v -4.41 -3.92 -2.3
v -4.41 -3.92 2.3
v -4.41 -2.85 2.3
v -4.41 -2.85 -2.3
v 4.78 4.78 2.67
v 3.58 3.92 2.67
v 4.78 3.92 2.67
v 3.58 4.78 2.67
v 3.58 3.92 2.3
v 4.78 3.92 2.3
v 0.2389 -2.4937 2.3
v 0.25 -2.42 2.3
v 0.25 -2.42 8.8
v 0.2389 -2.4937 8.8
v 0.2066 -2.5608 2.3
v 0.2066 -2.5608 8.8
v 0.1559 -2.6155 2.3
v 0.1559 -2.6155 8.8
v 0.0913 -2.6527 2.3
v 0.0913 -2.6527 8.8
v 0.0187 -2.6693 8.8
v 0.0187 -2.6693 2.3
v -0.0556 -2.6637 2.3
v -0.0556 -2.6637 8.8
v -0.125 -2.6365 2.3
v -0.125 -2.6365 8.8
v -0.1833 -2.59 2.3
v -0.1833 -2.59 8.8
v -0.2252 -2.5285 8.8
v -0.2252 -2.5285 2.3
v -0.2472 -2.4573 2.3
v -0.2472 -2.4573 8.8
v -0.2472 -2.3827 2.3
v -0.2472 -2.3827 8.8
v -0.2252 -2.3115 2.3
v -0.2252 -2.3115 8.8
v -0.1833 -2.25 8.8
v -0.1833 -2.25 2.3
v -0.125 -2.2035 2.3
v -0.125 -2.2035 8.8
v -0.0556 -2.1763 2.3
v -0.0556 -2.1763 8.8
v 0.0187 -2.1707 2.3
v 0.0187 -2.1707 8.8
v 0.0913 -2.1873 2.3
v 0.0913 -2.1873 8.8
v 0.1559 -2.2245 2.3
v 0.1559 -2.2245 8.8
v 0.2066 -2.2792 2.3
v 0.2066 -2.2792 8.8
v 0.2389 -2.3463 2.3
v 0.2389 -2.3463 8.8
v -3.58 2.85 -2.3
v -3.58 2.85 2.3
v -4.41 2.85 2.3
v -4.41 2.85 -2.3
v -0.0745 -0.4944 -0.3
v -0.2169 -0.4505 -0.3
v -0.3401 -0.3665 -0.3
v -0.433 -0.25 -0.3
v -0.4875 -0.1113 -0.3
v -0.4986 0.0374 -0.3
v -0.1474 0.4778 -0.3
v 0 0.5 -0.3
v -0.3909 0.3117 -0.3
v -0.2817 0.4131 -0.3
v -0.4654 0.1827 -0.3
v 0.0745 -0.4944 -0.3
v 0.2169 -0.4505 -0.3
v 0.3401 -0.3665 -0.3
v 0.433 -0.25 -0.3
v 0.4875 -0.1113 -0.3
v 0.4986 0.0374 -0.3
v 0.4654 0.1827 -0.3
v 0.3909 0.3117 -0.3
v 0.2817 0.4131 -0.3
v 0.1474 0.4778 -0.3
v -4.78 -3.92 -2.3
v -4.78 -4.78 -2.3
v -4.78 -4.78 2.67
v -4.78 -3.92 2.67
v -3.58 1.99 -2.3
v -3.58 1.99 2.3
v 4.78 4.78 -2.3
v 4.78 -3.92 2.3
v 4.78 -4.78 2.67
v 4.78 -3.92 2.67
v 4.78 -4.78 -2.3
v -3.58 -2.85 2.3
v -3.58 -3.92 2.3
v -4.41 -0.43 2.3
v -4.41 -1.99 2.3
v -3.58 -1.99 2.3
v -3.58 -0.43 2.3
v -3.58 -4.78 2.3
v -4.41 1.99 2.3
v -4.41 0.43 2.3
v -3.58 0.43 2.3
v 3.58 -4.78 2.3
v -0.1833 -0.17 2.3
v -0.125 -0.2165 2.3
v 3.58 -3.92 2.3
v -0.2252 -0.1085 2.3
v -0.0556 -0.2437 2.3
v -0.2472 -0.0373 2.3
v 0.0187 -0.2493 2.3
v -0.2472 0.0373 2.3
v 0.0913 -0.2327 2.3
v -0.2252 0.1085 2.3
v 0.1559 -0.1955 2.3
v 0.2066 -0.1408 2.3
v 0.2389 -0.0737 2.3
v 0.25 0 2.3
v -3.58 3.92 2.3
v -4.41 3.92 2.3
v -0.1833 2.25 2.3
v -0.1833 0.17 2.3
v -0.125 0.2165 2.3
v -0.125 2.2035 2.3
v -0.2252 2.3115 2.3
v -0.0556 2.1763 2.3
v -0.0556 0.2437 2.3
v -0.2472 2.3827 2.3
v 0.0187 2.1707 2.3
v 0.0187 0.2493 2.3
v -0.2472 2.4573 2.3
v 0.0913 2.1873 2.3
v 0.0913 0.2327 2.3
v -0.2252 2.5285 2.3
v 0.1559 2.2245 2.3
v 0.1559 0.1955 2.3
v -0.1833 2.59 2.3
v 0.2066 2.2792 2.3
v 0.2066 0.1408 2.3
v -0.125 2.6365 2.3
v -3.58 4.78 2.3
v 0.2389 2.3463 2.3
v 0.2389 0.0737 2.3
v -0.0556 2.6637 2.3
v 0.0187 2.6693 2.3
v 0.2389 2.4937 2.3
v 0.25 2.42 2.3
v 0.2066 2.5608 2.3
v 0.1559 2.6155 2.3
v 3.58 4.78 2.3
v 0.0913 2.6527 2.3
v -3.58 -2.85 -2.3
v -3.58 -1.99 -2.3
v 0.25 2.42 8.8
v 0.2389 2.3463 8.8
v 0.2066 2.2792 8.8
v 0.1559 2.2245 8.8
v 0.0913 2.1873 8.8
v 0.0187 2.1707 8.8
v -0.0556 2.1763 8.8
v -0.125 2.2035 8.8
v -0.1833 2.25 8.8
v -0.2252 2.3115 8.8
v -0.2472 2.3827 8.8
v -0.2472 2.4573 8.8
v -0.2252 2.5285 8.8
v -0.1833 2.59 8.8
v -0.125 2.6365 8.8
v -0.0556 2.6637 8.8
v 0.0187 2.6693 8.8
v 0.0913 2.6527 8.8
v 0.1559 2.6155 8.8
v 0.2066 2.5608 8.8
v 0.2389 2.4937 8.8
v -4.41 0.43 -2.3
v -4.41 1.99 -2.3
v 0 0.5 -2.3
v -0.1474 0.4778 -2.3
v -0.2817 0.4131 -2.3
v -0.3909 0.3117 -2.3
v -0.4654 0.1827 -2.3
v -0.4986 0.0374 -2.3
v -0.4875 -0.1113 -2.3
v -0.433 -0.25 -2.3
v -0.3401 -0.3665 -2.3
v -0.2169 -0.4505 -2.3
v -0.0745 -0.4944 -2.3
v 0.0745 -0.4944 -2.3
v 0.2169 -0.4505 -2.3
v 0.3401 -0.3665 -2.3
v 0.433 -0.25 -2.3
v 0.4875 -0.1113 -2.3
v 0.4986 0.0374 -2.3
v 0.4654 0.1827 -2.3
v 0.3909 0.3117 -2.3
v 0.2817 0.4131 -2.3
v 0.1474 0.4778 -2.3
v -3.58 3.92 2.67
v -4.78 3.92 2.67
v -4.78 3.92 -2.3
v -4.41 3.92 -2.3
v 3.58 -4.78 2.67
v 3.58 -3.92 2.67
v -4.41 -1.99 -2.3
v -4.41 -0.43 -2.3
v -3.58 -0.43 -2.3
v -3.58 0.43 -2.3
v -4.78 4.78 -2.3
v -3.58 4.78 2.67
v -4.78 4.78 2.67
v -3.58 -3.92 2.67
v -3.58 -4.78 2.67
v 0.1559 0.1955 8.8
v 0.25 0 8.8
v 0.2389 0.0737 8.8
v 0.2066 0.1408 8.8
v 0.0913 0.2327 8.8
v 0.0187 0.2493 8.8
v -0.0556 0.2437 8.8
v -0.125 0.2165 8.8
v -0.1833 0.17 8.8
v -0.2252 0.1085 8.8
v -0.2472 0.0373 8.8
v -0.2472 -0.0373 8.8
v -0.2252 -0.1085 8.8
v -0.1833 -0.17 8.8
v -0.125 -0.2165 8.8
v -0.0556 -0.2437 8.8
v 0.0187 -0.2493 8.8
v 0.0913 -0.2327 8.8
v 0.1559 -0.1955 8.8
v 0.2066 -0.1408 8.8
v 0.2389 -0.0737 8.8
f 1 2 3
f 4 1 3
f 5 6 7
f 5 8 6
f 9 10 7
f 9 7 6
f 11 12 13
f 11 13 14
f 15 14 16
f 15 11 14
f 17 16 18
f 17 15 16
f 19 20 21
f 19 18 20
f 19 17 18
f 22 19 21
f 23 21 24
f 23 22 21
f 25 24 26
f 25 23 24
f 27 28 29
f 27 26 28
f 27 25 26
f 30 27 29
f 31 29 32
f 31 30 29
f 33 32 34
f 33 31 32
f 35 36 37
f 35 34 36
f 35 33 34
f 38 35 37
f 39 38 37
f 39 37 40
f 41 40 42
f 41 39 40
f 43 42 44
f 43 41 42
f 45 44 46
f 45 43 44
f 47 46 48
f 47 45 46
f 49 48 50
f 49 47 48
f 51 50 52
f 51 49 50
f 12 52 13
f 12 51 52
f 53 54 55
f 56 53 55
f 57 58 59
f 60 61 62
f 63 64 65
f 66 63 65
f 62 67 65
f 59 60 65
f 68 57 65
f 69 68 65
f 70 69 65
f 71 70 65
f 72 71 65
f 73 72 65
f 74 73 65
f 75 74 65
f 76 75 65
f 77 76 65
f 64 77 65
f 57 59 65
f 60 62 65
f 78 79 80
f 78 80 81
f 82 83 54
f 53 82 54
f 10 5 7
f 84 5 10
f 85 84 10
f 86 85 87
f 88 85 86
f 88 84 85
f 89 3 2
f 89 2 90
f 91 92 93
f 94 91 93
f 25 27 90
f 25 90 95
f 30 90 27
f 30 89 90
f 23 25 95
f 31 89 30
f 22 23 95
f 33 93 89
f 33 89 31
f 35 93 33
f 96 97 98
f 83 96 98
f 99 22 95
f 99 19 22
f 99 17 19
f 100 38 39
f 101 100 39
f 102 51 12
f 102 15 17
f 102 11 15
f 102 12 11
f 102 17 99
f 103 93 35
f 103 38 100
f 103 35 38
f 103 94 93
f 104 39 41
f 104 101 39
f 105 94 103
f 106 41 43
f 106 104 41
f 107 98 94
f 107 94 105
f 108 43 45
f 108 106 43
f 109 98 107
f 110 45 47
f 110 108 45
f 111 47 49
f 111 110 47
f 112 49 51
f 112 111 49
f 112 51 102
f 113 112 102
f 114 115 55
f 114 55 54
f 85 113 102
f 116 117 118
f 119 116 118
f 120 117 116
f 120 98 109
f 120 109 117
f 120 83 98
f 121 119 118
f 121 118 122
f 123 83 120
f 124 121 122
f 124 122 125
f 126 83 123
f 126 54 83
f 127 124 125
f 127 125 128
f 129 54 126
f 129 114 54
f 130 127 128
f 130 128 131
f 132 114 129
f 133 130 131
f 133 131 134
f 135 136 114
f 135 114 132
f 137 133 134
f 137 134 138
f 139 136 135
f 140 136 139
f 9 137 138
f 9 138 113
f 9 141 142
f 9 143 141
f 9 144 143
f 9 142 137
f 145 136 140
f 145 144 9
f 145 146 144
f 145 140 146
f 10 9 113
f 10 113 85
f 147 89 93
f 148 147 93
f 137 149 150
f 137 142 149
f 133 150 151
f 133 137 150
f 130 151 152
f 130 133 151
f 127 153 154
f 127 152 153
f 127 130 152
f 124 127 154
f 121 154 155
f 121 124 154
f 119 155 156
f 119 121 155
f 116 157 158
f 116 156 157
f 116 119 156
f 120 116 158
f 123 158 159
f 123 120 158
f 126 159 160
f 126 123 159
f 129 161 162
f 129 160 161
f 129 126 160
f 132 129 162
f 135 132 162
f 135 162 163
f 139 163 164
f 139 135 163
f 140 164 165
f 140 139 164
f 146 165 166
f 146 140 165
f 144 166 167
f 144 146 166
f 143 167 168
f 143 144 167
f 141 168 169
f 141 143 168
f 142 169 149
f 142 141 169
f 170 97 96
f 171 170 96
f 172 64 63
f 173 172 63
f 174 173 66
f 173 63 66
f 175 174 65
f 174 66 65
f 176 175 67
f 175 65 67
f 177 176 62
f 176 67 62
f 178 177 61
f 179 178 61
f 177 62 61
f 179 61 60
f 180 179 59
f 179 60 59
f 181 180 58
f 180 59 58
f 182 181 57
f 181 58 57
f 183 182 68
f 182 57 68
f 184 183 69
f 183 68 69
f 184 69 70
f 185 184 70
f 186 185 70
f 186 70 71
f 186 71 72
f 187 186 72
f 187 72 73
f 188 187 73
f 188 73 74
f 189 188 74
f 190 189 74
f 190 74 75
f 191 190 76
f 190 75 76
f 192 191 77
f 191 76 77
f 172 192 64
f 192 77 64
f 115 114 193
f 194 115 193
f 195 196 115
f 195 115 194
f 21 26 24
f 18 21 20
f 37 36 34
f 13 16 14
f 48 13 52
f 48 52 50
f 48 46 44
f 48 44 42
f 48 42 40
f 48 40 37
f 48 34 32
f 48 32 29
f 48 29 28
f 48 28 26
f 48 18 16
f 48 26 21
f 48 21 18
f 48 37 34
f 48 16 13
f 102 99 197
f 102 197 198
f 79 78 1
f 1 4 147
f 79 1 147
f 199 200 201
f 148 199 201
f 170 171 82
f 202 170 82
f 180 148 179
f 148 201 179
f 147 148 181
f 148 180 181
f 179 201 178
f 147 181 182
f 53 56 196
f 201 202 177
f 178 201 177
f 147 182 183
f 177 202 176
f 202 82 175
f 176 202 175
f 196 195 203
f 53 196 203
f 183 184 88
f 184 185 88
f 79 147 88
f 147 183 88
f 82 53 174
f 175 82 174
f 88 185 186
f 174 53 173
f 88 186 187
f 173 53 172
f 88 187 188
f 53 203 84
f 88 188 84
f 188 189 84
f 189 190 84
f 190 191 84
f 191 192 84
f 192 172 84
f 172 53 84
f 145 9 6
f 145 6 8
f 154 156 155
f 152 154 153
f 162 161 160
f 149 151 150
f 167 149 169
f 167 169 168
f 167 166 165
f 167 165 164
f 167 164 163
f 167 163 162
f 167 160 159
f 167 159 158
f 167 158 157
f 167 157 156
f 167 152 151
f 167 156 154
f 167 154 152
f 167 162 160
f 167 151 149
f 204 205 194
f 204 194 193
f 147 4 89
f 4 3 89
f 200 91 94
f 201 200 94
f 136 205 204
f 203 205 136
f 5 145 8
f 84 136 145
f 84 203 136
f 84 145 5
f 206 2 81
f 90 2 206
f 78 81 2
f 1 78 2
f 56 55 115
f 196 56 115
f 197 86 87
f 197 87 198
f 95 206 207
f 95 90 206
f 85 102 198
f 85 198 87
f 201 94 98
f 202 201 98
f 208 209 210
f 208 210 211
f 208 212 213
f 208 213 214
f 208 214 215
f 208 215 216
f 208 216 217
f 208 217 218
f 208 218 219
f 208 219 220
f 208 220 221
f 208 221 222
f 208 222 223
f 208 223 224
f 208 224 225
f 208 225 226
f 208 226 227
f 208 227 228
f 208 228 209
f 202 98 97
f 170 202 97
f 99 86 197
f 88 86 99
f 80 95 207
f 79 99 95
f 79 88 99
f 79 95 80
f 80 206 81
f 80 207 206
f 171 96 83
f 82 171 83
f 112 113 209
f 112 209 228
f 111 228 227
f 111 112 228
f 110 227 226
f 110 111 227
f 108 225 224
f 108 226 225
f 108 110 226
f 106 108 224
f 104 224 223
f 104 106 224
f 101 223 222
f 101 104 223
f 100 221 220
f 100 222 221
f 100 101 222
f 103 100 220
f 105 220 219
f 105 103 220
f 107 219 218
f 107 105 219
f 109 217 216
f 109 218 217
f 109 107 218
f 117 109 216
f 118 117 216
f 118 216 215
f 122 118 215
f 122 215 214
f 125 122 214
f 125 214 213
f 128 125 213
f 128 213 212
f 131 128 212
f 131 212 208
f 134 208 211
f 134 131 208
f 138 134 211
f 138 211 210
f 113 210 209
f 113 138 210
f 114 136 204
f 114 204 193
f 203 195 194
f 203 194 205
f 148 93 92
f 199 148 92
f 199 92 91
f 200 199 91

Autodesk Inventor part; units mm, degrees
ref_plane "YZ Plane" through (0, 0, 0) normal (1, 0, 0) x (0, 1, 0)
ref_plane "XZ Plane" through (0, 0, 0) normal (0, 1, 0) x (-1, 0, 0)
ref_plane "XY Plane" through (0, 0, 0) normal (0, 0, 1) x (1, 0, 0)
sketch "Boceto1" plane through (0, 0, 0) normal (0, 0, 1) x (1, 0, 0)
  line L0 (-4.78, 4.78) -> (4.78, 4.78)
  line L1 (4.78, 4.78) -> (4.78, -4.78)
  line L2 (4.78, -4.78) -> (-4.78, -4.78)
  line L3 (-4.78, -4.78) -> (-4.78, 4.78)
  line L4 (-4.78, 4.78) -> (4.78, -4.78) construction
  line L5 (4.78, 4.78) -> (-4.78, -4.78) construction
  point P0 (0, 0)
  dimension "d0" = 9.56
  dimension "d1" = 9.56
extrude "Extrusión1" add sketch "Boceto1" along normal mid plane 4.6
sketch "Boceto2" plane through (0, 0, 2.3) normal (0, 0, 1) x (1, 0, 0)
  line L0 (-4.78, 4.78) -> (-3.58, 4.78)
  line L1 (-3.58, 4.78) -> (-3.58, 3.92)
  line L2 (-3.58, 3.92) -> (-4.78, 3.92)
  line L3 (-4.78, 3.92) -> (-4.78, 4.78)
  point P0 (0, 0)
  dimension "d4" = 1.2
  dimension "d5" = 0.86
extrude "Extrusión2" add sketch "Boceto2" along normal blind 0.37
mirror "Simetría1" about plane through (0, 0, 0) normal (0, 1, 0) of "Extrusión2"
mirror "Simetría2" about plane through (0, 0, 0) normal (1, 0, 0) of "Extrusión2", "Simetría1"
sketch "Boceto5" plane through (0, 0, 2.3) normal (0, 0, 1) x (1, 0, 0)
  line L0 (-3.58, 3.92) -> (-4.78, 3.92) projected
  line L1 (-4.78, -3.92) -> (-4.41, -3.92)
  line L2 (-4.41, -3.92) -> (-4.41, 3.92)
  line L3 (-4.41, 3.92) -> (-4.78, 3.92)
  line L4 (-4.78, 3.92) -> (-4.78, -3.92)
  point P0 (0, 0)
  dimension "d21" = 0.37
extrude "Extrusión4" cut sketch "Boceto5" against normal through all
sketch "Boceto6" plane through (0, 0, 2.3) normal (0, 0, 1) x (1, 0, 0)
  line L0 (-4.41, 3.92) -> (-4.41, -3.92) projected
  line L1 (-4.41, -3.92) -> (-3.58, -3.92) projected
  line L2 (-3.58, -2.85) -> (-3.58, -1.99)
  line L3 (-3.58, -1.99) -> (-4.41, -1.99)
  line L4 (-4.41, -2.85) -> (-3.58, -2.85)
  line L5 (-3.58, -4.78) -> (-4.78, -4.78) projected
  point P0 (0, 0)
  dimension "d24" = 1.93
  dimension "d25" = 0.86
  dimension "d26" = 0.86
extrude "Extrusión5" cut sketch "Boceto6" against normal through all
mirror "Simetría3" about plane through (0, 0, 0) normal (0, 1, 0) of "Extrusión5"
sketch "Boceto7" plane through (0, 0, 2.3) normal (0, 0, 1) x (1, 0, 0)
  line L0 (-3.58, 1.99) -> (-4.41, 1.99) projected
  line L1 (-4.41, 1.99) -> (-4.41, -1.99) projected
  line L2 (-4.41, -1.99) -> (-3.58, -1.99) projected
  line L3 (-3.58, -2.85) -> (-4.41, -2.85) projected
  line L4 (-3.58, 2.85) -> (-3.58, 1.99) projected
  line L5 (-4.41, -0.43) -> (-3.58, -0.43)
  line L6 (-3.58, -0.43) -> (-3.58, 0.43)
  line L7 (-3.58, 0.43) -> (-4.41, 0.43)
  point P0 (0, 0)
  dimension "d29" = 3.98
  dimension "d30" = 0.86
  dimension "d31" = 0.86
  dimension "d32" = 1.56
  dimension "d33" = 1.56
extrude "Extrusión6" cut sketch "Boceto7" against normal through all
sketch "Boceto8" plane through (0, 0, -2.3) normal (0, 0, -1) x (-1, 0, 0)
  circle A0 centre (0, 0) radius 0.5
  dimension "d36" = 1
hole "Hole1" at (0, 0, -2.3) direction (0, 0, 1) diameter 1 depth 2
sketch "Boceto9" plane through (0, 0, 2.3) normal (0, 0, 1) x (1, 0, 0)
  circle A0 centre (0, -2.42) radius 0.25
  circle A1 centre (0, 0) radius 0.25
  circle A2 centre (0, 2.42) radius 0.25
  dimension "d44" = 0.5
  dimension "d45" = 0.5
  dimension "d47" = 0.5
extrude "Extrusión7" add sketch "Boceto9" along normal blind 6.5
properties part number "BasePotenciometro"
